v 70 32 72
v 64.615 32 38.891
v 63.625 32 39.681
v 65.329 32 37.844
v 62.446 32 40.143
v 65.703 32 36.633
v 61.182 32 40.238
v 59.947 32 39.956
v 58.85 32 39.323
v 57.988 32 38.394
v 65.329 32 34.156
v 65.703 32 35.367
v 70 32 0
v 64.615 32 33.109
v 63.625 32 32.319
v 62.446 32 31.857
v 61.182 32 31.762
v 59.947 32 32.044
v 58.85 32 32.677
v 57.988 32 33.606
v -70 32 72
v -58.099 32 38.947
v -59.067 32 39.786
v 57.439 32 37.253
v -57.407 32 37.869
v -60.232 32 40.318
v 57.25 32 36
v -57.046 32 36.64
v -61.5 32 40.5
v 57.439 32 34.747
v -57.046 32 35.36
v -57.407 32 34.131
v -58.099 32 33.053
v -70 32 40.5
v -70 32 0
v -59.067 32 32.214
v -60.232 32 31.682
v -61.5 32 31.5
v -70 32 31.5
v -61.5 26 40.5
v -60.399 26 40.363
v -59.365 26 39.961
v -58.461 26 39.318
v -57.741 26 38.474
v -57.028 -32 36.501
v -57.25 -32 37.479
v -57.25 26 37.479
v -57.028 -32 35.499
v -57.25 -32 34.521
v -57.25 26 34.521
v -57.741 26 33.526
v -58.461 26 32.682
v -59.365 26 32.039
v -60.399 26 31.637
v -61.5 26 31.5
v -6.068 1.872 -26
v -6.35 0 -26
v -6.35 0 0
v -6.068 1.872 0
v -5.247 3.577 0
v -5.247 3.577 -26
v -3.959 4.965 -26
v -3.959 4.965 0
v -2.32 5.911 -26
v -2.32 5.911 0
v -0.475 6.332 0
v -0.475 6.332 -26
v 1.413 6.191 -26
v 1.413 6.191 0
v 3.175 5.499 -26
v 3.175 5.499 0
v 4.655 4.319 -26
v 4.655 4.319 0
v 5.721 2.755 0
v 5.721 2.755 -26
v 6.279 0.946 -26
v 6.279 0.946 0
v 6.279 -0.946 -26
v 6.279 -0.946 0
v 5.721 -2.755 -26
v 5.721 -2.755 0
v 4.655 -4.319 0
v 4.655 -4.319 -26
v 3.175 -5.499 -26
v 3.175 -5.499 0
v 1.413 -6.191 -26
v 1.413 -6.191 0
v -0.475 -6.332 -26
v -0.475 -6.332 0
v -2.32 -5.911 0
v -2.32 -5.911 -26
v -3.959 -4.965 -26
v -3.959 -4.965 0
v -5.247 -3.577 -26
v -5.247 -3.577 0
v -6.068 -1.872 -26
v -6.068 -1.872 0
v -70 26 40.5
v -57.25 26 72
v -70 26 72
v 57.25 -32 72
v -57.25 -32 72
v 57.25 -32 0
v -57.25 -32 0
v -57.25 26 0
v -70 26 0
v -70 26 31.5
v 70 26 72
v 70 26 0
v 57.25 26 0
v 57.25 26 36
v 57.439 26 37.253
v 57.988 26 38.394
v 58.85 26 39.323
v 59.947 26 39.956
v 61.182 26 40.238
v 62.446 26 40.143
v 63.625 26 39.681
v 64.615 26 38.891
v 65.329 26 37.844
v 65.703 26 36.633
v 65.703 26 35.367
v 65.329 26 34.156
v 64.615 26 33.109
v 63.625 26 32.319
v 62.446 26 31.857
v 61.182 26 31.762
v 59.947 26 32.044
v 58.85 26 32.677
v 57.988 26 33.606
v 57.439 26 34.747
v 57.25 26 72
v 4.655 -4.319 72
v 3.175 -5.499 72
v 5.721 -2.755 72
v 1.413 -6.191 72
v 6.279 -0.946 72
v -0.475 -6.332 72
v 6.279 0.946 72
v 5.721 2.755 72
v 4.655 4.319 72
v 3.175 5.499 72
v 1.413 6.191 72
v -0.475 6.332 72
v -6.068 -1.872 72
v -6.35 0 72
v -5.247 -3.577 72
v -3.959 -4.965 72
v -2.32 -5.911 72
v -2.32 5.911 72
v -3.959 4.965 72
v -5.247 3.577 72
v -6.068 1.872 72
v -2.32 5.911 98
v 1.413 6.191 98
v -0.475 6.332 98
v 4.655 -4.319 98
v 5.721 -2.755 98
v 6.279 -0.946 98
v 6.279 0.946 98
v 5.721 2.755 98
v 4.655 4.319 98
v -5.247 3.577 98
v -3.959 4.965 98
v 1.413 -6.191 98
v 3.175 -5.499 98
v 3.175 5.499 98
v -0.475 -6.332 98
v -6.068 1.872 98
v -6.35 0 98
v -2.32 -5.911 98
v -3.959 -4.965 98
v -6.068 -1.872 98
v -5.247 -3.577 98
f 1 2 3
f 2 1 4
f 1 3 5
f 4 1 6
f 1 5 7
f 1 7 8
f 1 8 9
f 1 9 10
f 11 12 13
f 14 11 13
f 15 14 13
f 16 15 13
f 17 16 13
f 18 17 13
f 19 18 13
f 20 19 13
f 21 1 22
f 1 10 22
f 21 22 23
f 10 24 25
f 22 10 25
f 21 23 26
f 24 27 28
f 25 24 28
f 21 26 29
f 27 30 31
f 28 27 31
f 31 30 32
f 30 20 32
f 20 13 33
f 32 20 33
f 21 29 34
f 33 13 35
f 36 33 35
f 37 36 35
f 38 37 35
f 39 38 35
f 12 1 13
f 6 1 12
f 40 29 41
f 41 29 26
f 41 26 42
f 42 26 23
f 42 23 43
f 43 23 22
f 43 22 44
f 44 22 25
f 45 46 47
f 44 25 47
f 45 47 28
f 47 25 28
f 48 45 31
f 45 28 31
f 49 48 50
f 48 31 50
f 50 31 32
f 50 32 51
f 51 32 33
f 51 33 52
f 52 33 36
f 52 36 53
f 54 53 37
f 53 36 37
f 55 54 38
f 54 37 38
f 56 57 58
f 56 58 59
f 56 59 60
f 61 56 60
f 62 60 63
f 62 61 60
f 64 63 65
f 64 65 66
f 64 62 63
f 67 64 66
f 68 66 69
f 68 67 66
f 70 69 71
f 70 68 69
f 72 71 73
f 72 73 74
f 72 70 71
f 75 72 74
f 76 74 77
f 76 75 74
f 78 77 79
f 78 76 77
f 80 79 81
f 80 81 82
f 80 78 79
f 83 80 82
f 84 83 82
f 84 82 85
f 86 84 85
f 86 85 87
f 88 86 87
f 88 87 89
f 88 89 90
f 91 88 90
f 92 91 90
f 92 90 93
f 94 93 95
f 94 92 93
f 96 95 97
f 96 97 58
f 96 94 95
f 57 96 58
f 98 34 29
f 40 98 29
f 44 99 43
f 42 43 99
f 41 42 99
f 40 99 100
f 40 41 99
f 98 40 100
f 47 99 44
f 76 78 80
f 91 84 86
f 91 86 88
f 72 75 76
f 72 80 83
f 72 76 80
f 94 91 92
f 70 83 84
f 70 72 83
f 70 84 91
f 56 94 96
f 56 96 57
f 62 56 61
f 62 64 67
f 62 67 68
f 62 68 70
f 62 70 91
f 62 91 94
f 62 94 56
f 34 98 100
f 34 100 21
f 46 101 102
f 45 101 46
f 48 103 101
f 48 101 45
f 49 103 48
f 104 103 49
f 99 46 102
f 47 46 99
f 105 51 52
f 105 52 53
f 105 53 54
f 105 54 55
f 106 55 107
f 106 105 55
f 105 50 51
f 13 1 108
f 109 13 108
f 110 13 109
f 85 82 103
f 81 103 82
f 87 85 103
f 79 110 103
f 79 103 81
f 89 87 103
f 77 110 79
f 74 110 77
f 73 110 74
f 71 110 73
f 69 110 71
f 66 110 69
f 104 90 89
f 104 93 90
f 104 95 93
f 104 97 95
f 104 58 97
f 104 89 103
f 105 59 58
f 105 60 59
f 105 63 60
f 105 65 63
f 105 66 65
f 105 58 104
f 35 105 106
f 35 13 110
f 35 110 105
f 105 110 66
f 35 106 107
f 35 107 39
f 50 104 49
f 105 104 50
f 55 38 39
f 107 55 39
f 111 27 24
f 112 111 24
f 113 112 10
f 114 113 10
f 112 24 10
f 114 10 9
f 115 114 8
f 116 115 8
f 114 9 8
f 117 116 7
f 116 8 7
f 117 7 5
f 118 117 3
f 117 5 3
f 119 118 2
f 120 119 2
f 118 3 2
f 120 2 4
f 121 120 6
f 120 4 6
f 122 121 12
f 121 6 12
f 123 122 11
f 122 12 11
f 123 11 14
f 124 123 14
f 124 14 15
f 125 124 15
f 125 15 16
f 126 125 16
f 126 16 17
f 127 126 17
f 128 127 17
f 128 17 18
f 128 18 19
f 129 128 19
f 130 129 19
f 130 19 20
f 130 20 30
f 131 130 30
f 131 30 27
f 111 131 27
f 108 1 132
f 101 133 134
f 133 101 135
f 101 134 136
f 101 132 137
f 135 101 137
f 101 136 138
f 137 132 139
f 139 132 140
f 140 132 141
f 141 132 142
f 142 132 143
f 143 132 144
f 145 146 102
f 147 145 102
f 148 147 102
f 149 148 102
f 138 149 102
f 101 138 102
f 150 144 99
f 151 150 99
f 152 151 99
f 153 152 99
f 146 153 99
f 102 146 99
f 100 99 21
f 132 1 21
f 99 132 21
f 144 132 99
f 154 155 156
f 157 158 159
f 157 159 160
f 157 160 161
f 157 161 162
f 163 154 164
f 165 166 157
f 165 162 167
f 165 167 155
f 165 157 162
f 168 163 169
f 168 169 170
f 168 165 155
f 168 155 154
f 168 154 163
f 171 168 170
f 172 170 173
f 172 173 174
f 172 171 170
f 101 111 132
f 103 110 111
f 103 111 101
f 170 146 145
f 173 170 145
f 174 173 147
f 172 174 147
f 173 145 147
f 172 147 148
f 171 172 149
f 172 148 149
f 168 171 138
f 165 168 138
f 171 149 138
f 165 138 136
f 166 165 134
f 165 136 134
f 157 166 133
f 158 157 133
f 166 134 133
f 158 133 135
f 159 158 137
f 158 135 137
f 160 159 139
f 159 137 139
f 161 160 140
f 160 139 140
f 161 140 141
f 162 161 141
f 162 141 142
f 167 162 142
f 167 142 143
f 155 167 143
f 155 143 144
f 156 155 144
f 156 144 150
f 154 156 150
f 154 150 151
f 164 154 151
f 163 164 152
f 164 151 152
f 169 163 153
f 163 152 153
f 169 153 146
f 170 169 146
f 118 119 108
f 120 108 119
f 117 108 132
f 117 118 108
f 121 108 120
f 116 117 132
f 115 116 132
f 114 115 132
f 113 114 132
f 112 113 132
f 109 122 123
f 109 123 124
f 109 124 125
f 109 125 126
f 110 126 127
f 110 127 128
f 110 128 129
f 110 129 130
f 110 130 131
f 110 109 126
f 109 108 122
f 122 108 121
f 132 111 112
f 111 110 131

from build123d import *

# Parameters (mm, degrees)
BOSS_EXTRUDE1_DEPTH = 72
SKETCH2_R           = 4.25
CUT_EXTRUDE1_DEPTH  = 120.079805173
SKETCH3_R           = 6.35
BOSS_EXTRUDE2_DEPTH = 26
BOSS_EXTRUDE3_START = 26
SKETCH5_R           = 6.35
BOSS_EXTRUDE3_DEPTH = 26


with BuildPart() as part:
    # Sketch1 → Boss-Extrude1 (new body)
    with BuildSketch(Plane.XY):
        Polygon((-57.25, 32), (57.25, 32), (70, 32), (70, 26), (57.25, 26), (57.25, -32), (-57.25, -32), (-57.25, 26), (-70, 26), (-70, 32), align=None)
    extrude(amount=BOSS_EXTRUDE1_DEPTH)

    # Sketch2 → Cut-Extrude1 (cut, through all)
    with BuildSketch(Plane(origin=(0, 32, 0), x_dir=(1, 0, 0), z_dir=(0, 1, 0))):
        with Locations(Location((61.5, -36, 0), (0, 0, 180))):
            Circle(SKETCH2_R)
        with BuildLine():
            Line((-61.5, -31.5), (-70, -31.5))
            Line((-70, -31.5), (-70, -40.5))
            Line((-70, -40.5), (-61.5, -40.5))
            ThreePointArc((-61.5, -40.5), (-57, -36), (-61.5, -31.5))
        make_face()
    extrude(amount=-CUT_EXTRUDE1_DEPTH, mode=Mode.SUBTRACT)

    # Sketch3 → Boss-Extrude2 (add)
    with BuildSketch(Plane.XY.offset(72)):
        with Locations(Location((0, 0, 0), (0, 0, 180))):
            Circle(SKETCH3_R)
    extrude(amount=BOSS_EXTRUDE2_DEPTH)

    # Sketch5 → Boss-Extrude3 (add)
    with BuildSketch(Plane(origin=(0, 0, 0), x_dir=(-1, 0, 0), z_dir=(0, 0, -1)).offset(BOSS_EXTRUDE3_START)):
        Circle(SKETCH5_R)
    extrude(amount=-BOSS_EXTRUDE3_DEPTH)


solid = part.part
